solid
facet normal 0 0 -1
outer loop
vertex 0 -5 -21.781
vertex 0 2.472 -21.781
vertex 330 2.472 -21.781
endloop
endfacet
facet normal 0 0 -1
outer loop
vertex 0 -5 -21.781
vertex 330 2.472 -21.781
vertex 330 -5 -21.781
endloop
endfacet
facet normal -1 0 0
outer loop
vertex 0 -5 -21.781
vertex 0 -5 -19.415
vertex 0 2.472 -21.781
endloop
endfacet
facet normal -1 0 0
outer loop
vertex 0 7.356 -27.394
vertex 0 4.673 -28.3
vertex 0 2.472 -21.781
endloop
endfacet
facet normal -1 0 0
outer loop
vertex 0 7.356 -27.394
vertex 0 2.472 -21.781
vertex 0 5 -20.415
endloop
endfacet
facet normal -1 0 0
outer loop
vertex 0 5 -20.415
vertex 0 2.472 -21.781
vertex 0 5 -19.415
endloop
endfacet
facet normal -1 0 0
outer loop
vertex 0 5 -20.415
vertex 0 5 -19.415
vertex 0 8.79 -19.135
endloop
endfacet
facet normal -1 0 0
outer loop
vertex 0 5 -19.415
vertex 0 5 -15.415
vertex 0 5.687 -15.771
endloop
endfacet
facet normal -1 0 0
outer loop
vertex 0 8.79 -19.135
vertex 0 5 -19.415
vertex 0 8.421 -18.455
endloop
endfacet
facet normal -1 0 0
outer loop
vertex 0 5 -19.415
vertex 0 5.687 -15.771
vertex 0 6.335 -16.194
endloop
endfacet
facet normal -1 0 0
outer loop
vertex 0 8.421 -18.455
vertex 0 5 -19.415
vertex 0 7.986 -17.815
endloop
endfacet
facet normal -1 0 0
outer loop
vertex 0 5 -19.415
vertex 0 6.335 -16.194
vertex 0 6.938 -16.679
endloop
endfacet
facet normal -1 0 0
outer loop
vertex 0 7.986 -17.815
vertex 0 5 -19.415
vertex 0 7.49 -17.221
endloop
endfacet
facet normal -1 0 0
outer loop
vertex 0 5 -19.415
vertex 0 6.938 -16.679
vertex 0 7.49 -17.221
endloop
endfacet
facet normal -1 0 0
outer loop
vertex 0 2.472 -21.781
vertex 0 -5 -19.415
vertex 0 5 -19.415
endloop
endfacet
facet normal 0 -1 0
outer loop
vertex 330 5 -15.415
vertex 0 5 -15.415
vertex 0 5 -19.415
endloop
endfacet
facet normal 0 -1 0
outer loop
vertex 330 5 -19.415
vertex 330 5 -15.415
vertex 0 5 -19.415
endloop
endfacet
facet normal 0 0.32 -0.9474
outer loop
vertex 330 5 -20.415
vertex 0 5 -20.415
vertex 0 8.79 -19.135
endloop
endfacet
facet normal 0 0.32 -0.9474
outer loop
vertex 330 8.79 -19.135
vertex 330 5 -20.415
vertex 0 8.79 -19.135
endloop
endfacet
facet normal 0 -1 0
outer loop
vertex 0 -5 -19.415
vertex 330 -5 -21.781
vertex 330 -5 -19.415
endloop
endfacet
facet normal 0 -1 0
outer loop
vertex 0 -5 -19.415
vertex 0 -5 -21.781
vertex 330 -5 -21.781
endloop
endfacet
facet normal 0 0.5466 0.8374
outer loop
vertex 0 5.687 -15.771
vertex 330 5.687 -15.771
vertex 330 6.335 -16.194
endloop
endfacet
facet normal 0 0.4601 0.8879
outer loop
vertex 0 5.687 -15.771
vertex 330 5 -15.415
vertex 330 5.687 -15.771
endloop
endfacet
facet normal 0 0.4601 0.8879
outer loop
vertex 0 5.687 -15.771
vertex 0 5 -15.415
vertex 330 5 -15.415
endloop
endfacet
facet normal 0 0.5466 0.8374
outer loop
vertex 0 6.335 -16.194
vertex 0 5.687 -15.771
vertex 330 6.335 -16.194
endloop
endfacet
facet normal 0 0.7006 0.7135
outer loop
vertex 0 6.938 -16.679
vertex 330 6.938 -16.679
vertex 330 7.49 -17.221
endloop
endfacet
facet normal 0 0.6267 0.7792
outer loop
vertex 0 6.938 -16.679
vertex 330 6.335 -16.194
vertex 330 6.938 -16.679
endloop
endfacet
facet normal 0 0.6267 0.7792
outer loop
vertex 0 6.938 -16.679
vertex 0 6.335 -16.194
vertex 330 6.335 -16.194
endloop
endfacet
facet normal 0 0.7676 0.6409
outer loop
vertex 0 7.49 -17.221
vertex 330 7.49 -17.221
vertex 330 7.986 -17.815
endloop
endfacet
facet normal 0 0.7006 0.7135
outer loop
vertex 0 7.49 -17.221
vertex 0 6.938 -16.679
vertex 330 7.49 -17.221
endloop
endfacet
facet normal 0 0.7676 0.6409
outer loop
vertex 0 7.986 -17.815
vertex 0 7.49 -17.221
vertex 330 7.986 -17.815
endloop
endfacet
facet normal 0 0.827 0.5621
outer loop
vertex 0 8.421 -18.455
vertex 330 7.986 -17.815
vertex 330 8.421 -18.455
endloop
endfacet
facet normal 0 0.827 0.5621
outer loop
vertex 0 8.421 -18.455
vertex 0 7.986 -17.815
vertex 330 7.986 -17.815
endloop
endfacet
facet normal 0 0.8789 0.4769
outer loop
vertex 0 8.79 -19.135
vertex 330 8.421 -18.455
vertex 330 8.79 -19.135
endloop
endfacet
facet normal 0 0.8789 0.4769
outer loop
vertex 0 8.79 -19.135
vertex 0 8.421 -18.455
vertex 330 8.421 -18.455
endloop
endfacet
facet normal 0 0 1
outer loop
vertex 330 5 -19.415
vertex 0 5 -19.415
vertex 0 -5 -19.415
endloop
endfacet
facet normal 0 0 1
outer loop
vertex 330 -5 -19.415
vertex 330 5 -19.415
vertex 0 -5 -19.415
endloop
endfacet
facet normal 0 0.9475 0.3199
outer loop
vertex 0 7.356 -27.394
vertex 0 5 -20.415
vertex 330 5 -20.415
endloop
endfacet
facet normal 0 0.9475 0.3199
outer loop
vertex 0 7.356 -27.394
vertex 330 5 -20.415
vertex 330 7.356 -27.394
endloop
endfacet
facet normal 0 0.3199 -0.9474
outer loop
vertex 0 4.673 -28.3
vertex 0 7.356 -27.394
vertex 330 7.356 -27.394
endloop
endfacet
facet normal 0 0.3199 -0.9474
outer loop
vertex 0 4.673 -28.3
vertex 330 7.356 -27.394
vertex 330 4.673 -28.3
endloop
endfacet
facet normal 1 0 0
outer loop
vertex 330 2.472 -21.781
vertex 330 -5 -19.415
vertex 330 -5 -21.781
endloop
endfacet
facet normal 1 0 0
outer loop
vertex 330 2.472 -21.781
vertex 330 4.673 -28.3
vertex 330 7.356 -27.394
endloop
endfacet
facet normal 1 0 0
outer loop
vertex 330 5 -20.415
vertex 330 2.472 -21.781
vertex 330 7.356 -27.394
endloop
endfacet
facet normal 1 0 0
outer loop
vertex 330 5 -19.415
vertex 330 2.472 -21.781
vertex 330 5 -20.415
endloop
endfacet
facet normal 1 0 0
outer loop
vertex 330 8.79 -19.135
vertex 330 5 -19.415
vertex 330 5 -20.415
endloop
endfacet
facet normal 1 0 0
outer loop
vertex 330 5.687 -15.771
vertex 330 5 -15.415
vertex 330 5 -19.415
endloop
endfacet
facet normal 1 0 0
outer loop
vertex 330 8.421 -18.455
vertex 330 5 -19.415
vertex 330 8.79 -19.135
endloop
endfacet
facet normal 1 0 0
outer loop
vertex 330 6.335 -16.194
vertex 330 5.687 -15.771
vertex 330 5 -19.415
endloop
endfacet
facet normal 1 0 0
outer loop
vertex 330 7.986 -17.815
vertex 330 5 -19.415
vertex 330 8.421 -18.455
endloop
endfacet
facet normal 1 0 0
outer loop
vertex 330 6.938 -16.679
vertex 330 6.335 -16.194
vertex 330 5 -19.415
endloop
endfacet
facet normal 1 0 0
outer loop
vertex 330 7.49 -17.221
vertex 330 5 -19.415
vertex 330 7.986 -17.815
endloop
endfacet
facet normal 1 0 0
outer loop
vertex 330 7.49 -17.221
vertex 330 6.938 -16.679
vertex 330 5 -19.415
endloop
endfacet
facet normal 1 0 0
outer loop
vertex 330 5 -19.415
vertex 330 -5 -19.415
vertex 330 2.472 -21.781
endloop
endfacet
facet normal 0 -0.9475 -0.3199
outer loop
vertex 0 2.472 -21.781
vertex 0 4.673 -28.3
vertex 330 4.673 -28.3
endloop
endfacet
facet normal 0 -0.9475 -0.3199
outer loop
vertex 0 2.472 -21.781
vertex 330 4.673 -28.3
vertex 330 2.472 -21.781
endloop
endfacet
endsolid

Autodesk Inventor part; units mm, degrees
ref_plane "YZ Plane" through (0, 0, 0) normal (1, 0, 0) x (0, 1, 0)
ref_plane "XZ Plane" through (0, 0, 0) normal (0, 1, 0) x (-1, 0, 0)
ref_plane "XY Plane" through (0, 0, 0) normal (0, 0, 1) x (1, 0, 0)
sketch "Sketch1" plane through (0, 0, 0) normal (1, 0, 0) x (0, 1, 0)
  line L0 (5, -15.415) -> (5, -19.415)
  line L1 (5, -19.415) -> (-5, -19.415)
  line L2 (5, -20.415) -> (8.7898, -19.1353)
  line L3 (5, -20.415) -> (7.3565, -27.3935)
  line L4 (7.3565, -27.3935) -> (4.6727, -28.2998)
  line L5 (4.6727, -28.2998) -> (2.4715, -21.7812)
  line L6 (2.4715, -21.7812) -> (-5, -21.7812)
  line L7 (-5, -21.7812) -> (-5, -19.415)
  arc A0 (8.7898, -19.1353) -> (5, -15.415) centre (1.7532, -22.5129) ccw
  point P0 (0, 0)
  point P1 (0, -20.415)
  dimension "d0" = 4
  dimension "d4" = 4
extrude "Extrusion1" add sketch "Sketch1" along normal blind 330
properties part number "junta controler"
